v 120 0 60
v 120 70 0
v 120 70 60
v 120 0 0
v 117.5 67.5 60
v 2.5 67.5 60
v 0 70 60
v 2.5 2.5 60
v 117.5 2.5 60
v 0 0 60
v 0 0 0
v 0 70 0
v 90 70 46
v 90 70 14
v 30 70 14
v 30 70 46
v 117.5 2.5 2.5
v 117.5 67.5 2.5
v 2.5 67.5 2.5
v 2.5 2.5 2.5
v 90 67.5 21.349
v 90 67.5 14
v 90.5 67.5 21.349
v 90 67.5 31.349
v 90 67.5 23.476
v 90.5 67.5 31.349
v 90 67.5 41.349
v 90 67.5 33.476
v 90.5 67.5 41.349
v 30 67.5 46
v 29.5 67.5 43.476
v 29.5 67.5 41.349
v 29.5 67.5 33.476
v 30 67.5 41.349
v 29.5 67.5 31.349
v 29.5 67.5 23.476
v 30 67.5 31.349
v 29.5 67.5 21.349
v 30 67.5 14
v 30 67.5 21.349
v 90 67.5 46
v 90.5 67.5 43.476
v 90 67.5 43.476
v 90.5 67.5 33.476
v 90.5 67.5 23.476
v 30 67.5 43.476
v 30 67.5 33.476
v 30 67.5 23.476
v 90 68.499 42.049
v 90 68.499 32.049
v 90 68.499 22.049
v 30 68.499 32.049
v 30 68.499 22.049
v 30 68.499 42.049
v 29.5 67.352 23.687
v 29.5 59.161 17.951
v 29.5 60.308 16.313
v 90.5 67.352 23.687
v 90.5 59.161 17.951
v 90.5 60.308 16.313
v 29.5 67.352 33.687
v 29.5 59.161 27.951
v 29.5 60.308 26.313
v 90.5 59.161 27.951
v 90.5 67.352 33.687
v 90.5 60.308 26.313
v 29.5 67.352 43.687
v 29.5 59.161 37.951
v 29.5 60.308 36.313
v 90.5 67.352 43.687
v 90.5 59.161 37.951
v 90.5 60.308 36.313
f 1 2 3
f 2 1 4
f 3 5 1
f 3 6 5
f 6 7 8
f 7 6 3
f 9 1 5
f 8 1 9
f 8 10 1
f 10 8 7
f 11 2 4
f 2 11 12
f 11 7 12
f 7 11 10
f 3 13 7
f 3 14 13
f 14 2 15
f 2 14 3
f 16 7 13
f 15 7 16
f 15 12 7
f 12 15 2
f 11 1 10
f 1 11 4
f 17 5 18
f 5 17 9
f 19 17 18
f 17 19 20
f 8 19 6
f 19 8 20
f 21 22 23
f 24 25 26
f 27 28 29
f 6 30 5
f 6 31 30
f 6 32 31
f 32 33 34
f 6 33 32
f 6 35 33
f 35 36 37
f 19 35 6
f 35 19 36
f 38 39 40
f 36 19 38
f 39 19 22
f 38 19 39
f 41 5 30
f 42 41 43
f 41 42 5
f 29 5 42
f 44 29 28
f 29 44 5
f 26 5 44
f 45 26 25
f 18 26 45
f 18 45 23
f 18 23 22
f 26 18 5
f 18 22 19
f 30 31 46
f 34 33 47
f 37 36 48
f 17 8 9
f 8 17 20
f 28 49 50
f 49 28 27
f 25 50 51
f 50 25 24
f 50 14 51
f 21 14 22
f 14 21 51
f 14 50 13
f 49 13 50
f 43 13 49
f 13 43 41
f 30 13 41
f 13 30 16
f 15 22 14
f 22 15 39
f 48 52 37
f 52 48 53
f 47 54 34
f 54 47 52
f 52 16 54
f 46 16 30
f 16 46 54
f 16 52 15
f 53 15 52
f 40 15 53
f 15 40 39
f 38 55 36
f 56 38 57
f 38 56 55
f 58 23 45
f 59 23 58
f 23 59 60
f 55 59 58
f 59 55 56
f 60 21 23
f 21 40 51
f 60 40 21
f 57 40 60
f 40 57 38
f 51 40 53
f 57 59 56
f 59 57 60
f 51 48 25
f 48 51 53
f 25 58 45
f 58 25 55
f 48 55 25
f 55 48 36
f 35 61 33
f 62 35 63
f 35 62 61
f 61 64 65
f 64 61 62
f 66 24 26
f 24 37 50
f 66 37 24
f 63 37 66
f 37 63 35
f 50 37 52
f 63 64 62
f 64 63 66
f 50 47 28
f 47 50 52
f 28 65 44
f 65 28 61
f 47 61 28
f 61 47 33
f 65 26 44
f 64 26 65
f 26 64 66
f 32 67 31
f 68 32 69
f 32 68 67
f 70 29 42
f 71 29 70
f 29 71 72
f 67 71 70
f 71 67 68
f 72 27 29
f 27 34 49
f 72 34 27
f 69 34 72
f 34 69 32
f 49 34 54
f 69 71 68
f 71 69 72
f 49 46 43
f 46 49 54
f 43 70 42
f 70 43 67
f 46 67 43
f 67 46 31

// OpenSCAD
$fn = 32;

// ----------------------------------------------------------------------
// Vent box: louvers enclosure
// ----------------------------------------------------------------------

// --- parameters (mm) ---
box_l = 120;              // box length, X
box_w = 70;               // box width, Y
box_h = 60;               // box height, Z
wall_t = 2.5;             // shell wall thickness
win_l = 60;               // vent window width, X
win_h = 32;               // vent window height, Z
slat_t = 2;               // louver slat thickness
slat_d = 10;              // louver slat depth
slat_a = 35;              // louver slat angle, degrees
slat_pitch = 10;          // louver pitch
slat_yc = 63.83;          // slat centreline Y

win_z0 = (box_h - win_h) / 2;  // window lower edge Z
n_slats = 3;  // louver count
slat_z0 = win_z0 + (win_h - (n_slats - 1) * slat_pitch) / 2;

difference() {
  union() {
    difference() {
      cube([box_l, box_w, box_h]);
  translate([wall_t, wall_t, wall_t])
    cube([box_l - 2 * wall_t, box_w - 2 * wall_t, box_h]);
  translate([(box_l - win_l) / 2, box_w - wall_t - 1, win_z0])
    cube([win_l, wall_t + 2, win_h]);
    }
    for (i = [0 : n_slats - 1])
      translate([box_l / 2, slat_yc, slat_z0 + i * slat_pitch])
        rotate([slat_a, 0, 0])
          cube([win_l + 1, slat_d, slat_t], center = true);
  }
}
